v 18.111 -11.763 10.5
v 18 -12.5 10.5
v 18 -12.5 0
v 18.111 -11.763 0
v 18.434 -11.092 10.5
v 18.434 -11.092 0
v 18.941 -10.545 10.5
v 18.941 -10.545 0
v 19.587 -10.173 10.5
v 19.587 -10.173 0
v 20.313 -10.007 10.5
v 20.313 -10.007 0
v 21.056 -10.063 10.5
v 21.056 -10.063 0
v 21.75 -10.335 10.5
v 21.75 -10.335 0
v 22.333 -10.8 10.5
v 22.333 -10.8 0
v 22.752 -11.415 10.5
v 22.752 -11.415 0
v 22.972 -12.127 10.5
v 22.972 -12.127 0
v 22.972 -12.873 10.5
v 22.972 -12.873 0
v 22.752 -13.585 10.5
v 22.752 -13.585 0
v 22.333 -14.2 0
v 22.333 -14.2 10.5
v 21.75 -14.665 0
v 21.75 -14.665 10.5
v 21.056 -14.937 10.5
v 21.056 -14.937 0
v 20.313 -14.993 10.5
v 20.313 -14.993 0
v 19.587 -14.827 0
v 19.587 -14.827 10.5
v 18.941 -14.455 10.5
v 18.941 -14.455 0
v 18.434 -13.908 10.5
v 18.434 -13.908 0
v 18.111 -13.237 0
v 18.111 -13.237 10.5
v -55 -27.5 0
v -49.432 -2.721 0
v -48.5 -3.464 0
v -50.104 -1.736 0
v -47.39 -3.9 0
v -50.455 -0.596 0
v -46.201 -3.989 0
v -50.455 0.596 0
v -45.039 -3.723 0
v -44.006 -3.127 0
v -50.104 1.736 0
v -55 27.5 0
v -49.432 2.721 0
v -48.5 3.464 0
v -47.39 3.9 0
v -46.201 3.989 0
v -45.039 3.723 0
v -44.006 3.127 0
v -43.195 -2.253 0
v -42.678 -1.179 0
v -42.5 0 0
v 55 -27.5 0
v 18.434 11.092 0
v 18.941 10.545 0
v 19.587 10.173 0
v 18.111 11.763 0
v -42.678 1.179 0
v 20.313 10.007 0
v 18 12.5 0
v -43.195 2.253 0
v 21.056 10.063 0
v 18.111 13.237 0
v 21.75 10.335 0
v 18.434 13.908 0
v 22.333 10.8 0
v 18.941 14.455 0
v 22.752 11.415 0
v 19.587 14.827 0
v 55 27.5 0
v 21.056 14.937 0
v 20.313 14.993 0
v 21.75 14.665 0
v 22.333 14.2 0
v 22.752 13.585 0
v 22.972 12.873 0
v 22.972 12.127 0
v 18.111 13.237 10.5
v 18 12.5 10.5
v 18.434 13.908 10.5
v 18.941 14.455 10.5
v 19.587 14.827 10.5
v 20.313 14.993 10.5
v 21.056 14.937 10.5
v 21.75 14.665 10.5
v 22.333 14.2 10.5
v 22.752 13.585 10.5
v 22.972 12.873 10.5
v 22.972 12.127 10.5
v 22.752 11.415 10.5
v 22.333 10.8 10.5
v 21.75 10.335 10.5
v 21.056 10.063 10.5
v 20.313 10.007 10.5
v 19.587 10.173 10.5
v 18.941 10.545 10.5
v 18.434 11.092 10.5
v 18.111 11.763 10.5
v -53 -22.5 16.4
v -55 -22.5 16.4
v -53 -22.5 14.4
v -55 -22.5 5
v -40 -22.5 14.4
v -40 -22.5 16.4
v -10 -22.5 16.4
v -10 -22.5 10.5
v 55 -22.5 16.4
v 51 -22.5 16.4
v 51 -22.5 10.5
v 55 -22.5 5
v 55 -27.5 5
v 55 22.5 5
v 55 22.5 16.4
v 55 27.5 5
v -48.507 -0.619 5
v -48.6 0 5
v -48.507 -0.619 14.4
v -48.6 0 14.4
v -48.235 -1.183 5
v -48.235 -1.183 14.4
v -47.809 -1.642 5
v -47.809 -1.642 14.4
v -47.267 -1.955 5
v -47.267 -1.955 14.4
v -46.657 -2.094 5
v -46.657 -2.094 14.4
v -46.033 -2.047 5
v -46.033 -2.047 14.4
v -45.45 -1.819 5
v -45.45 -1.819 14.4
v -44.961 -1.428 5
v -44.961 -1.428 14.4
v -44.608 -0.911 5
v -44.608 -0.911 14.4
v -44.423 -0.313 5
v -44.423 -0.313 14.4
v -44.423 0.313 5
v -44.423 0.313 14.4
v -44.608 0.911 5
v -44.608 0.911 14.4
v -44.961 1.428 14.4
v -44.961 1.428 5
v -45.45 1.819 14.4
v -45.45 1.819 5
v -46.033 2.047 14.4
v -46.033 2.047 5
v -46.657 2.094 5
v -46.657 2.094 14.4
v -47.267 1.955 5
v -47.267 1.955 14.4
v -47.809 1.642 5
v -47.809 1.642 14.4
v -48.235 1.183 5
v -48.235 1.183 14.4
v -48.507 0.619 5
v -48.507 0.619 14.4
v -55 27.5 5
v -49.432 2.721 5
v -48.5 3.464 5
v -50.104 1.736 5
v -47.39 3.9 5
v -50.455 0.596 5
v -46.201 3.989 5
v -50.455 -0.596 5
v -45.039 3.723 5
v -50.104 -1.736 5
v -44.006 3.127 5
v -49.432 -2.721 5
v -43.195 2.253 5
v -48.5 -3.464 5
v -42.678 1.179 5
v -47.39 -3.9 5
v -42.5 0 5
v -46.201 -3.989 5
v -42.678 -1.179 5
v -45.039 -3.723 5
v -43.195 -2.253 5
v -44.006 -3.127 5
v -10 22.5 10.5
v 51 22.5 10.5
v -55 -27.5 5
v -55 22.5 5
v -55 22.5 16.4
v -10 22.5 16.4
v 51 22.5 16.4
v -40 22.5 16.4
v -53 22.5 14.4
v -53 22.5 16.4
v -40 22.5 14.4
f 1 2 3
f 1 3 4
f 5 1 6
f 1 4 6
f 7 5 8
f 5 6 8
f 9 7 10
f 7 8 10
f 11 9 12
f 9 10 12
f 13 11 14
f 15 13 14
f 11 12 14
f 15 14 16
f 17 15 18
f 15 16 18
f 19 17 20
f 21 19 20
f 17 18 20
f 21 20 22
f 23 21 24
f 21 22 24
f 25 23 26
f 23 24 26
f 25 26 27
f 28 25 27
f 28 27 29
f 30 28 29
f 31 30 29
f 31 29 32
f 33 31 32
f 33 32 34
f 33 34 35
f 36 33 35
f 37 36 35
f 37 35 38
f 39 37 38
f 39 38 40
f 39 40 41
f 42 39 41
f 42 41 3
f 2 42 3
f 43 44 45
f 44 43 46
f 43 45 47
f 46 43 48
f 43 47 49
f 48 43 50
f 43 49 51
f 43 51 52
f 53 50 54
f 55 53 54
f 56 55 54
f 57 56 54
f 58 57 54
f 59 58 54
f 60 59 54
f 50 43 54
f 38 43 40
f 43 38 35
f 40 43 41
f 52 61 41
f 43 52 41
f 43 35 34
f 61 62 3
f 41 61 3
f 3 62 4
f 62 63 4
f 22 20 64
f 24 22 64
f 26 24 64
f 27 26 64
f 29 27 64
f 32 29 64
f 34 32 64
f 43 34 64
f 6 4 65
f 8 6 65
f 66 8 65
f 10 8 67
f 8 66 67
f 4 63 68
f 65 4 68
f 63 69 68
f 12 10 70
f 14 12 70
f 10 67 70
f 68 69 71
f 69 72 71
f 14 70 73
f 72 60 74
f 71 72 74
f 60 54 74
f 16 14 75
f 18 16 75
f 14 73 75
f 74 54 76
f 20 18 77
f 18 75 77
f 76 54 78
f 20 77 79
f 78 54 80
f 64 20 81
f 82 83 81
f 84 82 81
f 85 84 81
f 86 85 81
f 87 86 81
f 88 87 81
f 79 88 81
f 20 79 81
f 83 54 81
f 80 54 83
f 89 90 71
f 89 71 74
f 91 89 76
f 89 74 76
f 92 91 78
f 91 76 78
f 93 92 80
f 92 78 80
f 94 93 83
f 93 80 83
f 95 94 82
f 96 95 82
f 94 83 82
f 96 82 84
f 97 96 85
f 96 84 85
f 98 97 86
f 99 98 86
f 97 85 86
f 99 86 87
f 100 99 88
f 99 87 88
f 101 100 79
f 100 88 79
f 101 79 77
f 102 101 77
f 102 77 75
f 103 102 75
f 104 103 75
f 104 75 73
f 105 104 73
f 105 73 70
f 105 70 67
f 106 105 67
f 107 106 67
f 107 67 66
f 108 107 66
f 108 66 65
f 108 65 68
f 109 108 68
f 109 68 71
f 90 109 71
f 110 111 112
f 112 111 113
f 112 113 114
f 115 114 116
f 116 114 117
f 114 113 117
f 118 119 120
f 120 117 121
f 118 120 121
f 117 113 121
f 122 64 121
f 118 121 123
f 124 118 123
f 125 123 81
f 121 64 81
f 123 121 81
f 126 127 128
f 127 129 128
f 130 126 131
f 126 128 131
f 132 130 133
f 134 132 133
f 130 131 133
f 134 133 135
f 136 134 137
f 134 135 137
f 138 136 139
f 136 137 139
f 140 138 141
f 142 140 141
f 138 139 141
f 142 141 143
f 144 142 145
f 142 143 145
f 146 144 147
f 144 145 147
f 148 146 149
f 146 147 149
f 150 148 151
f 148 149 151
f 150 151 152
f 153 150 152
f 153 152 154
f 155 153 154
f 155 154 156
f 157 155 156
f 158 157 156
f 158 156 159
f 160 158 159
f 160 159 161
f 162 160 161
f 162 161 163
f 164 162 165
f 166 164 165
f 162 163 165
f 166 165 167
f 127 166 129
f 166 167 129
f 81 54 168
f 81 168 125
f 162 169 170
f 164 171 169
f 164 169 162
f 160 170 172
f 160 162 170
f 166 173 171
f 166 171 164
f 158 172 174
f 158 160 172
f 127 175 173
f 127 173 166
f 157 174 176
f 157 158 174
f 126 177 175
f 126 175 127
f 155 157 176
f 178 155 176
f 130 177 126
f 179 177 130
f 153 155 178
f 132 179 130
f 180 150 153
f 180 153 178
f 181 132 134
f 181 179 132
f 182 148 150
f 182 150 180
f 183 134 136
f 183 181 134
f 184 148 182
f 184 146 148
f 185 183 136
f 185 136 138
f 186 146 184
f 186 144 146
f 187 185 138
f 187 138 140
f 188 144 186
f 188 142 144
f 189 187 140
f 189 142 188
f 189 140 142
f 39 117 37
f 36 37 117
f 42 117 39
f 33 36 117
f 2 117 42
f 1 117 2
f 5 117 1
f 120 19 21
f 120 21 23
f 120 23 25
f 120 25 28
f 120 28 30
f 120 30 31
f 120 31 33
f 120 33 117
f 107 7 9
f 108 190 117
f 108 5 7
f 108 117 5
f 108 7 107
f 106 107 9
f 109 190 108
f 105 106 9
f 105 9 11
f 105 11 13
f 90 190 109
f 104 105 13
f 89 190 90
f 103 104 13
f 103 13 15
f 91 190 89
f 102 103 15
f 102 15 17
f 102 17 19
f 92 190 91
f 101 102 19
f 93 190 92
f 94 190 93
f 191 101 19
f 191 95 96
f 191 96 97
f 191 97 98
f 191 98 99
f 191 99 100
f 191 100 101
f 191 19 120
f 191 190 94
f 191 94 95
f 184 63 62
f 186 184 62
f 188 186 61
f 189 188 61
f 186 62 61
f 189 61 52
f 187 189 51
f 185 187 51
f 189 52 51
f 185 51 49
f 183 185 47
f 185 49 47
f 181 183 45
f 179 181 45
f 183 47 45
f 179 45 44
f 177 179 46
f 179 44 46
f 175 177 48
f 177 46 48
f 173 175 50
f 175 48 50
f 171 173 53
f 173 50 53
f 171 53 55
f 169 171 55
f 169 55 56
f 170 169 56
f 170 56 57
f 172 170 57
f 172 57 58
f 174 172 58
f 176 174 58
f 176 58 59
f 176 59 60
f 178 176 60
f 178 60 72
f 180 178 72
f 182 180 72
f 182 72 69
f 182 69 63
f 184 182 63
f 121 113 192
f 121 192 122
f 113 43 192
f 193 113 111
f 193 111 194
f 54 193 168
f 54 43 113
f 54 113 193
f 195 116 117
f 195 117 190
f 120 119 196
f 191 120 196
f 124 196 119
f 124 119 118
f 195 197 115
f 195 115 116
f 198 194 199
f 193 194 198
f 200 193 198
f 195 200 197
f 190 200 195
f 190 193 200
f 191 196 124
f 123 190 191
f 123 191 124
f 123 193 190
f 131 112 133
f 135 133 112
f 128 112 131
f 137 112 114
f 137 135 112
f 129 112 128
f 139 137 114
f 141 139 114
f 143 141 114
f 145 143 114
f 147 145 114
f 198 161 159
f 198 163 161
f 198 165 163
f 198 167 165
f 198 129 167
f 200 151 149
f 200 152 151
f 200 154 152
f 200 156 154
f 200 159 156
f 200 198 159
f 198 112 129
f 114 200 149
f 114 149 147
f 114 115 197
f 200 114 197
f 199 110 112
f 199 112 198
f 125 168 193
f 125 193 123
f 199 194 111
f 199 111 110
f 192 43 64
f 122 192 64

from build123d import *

# Parameters (mm, degrees)
F0_W           = 110
F0_H           = 55
F1_DEPTH       = 5
F2_W           = 110
F2_H           = 45
F3_DEPTH       = 11.4
F4_W           = 13
F4_H           = 45
F5_DEPTH       = 2
F4_W_2         = 61
F6_DEPTH       = 5.9
F8_D           = 4.2
F8_CBORE_D     = 8
F8_CBORE_DEPTH = 5
F10_D          = 5


with BuildPart() as f1:
    # F0 (on Top) → F1 (new body)
    with BuildSketch(Plane.XY):
        Rectangle(F0_W, F0_H)
    extrude(amount=F1_DEPTH)

    # F2 (on face) → F3 (join)
    with BuildSketch(Plane.XY.offset(5)):
        Rectangle(F2_W, F2_H)
    extrude(amount=F3_DEPTH)

    # F4 (on face) → F5 (cut)
    with BuildSketch(Plane.XY.offset(16.4)):
        with Locations((-46.5, 0)):
            Rectangle(F4_W, F4_H)
    extrude(amount=-F5_DEPTH, mode=Mode.SUBTRACT)

    # F4 (on face) → F6 (cut)
    with BuildSketch(Plane.XY.offset(16.4)):
        with Locations((20.5, 0)):
            Rectangle(F4_W_2, F4_H)
    extrude(amount=-F6_DEPTH, mode=Mode.SUBTRACT)

    # F8 (through all)
    with Locations(Plane(origin=(0, 0, 0), x_dir=(1, 0, 0), z_dir=(0, 0, -1))):
        with Locations((-46.5, 0)):
            CounterBoreHole(F8_D / 2, F8_CBORE_D / 2, F8_CBORE_DEPTH)

    # F10 (through all)
    with Locations(Plane.XY.offset(10.5)):
        with Locations((20.5, 12.5), (20.5, -12.5)):
            Hole(F10_D / 2)


solid = f1.part
